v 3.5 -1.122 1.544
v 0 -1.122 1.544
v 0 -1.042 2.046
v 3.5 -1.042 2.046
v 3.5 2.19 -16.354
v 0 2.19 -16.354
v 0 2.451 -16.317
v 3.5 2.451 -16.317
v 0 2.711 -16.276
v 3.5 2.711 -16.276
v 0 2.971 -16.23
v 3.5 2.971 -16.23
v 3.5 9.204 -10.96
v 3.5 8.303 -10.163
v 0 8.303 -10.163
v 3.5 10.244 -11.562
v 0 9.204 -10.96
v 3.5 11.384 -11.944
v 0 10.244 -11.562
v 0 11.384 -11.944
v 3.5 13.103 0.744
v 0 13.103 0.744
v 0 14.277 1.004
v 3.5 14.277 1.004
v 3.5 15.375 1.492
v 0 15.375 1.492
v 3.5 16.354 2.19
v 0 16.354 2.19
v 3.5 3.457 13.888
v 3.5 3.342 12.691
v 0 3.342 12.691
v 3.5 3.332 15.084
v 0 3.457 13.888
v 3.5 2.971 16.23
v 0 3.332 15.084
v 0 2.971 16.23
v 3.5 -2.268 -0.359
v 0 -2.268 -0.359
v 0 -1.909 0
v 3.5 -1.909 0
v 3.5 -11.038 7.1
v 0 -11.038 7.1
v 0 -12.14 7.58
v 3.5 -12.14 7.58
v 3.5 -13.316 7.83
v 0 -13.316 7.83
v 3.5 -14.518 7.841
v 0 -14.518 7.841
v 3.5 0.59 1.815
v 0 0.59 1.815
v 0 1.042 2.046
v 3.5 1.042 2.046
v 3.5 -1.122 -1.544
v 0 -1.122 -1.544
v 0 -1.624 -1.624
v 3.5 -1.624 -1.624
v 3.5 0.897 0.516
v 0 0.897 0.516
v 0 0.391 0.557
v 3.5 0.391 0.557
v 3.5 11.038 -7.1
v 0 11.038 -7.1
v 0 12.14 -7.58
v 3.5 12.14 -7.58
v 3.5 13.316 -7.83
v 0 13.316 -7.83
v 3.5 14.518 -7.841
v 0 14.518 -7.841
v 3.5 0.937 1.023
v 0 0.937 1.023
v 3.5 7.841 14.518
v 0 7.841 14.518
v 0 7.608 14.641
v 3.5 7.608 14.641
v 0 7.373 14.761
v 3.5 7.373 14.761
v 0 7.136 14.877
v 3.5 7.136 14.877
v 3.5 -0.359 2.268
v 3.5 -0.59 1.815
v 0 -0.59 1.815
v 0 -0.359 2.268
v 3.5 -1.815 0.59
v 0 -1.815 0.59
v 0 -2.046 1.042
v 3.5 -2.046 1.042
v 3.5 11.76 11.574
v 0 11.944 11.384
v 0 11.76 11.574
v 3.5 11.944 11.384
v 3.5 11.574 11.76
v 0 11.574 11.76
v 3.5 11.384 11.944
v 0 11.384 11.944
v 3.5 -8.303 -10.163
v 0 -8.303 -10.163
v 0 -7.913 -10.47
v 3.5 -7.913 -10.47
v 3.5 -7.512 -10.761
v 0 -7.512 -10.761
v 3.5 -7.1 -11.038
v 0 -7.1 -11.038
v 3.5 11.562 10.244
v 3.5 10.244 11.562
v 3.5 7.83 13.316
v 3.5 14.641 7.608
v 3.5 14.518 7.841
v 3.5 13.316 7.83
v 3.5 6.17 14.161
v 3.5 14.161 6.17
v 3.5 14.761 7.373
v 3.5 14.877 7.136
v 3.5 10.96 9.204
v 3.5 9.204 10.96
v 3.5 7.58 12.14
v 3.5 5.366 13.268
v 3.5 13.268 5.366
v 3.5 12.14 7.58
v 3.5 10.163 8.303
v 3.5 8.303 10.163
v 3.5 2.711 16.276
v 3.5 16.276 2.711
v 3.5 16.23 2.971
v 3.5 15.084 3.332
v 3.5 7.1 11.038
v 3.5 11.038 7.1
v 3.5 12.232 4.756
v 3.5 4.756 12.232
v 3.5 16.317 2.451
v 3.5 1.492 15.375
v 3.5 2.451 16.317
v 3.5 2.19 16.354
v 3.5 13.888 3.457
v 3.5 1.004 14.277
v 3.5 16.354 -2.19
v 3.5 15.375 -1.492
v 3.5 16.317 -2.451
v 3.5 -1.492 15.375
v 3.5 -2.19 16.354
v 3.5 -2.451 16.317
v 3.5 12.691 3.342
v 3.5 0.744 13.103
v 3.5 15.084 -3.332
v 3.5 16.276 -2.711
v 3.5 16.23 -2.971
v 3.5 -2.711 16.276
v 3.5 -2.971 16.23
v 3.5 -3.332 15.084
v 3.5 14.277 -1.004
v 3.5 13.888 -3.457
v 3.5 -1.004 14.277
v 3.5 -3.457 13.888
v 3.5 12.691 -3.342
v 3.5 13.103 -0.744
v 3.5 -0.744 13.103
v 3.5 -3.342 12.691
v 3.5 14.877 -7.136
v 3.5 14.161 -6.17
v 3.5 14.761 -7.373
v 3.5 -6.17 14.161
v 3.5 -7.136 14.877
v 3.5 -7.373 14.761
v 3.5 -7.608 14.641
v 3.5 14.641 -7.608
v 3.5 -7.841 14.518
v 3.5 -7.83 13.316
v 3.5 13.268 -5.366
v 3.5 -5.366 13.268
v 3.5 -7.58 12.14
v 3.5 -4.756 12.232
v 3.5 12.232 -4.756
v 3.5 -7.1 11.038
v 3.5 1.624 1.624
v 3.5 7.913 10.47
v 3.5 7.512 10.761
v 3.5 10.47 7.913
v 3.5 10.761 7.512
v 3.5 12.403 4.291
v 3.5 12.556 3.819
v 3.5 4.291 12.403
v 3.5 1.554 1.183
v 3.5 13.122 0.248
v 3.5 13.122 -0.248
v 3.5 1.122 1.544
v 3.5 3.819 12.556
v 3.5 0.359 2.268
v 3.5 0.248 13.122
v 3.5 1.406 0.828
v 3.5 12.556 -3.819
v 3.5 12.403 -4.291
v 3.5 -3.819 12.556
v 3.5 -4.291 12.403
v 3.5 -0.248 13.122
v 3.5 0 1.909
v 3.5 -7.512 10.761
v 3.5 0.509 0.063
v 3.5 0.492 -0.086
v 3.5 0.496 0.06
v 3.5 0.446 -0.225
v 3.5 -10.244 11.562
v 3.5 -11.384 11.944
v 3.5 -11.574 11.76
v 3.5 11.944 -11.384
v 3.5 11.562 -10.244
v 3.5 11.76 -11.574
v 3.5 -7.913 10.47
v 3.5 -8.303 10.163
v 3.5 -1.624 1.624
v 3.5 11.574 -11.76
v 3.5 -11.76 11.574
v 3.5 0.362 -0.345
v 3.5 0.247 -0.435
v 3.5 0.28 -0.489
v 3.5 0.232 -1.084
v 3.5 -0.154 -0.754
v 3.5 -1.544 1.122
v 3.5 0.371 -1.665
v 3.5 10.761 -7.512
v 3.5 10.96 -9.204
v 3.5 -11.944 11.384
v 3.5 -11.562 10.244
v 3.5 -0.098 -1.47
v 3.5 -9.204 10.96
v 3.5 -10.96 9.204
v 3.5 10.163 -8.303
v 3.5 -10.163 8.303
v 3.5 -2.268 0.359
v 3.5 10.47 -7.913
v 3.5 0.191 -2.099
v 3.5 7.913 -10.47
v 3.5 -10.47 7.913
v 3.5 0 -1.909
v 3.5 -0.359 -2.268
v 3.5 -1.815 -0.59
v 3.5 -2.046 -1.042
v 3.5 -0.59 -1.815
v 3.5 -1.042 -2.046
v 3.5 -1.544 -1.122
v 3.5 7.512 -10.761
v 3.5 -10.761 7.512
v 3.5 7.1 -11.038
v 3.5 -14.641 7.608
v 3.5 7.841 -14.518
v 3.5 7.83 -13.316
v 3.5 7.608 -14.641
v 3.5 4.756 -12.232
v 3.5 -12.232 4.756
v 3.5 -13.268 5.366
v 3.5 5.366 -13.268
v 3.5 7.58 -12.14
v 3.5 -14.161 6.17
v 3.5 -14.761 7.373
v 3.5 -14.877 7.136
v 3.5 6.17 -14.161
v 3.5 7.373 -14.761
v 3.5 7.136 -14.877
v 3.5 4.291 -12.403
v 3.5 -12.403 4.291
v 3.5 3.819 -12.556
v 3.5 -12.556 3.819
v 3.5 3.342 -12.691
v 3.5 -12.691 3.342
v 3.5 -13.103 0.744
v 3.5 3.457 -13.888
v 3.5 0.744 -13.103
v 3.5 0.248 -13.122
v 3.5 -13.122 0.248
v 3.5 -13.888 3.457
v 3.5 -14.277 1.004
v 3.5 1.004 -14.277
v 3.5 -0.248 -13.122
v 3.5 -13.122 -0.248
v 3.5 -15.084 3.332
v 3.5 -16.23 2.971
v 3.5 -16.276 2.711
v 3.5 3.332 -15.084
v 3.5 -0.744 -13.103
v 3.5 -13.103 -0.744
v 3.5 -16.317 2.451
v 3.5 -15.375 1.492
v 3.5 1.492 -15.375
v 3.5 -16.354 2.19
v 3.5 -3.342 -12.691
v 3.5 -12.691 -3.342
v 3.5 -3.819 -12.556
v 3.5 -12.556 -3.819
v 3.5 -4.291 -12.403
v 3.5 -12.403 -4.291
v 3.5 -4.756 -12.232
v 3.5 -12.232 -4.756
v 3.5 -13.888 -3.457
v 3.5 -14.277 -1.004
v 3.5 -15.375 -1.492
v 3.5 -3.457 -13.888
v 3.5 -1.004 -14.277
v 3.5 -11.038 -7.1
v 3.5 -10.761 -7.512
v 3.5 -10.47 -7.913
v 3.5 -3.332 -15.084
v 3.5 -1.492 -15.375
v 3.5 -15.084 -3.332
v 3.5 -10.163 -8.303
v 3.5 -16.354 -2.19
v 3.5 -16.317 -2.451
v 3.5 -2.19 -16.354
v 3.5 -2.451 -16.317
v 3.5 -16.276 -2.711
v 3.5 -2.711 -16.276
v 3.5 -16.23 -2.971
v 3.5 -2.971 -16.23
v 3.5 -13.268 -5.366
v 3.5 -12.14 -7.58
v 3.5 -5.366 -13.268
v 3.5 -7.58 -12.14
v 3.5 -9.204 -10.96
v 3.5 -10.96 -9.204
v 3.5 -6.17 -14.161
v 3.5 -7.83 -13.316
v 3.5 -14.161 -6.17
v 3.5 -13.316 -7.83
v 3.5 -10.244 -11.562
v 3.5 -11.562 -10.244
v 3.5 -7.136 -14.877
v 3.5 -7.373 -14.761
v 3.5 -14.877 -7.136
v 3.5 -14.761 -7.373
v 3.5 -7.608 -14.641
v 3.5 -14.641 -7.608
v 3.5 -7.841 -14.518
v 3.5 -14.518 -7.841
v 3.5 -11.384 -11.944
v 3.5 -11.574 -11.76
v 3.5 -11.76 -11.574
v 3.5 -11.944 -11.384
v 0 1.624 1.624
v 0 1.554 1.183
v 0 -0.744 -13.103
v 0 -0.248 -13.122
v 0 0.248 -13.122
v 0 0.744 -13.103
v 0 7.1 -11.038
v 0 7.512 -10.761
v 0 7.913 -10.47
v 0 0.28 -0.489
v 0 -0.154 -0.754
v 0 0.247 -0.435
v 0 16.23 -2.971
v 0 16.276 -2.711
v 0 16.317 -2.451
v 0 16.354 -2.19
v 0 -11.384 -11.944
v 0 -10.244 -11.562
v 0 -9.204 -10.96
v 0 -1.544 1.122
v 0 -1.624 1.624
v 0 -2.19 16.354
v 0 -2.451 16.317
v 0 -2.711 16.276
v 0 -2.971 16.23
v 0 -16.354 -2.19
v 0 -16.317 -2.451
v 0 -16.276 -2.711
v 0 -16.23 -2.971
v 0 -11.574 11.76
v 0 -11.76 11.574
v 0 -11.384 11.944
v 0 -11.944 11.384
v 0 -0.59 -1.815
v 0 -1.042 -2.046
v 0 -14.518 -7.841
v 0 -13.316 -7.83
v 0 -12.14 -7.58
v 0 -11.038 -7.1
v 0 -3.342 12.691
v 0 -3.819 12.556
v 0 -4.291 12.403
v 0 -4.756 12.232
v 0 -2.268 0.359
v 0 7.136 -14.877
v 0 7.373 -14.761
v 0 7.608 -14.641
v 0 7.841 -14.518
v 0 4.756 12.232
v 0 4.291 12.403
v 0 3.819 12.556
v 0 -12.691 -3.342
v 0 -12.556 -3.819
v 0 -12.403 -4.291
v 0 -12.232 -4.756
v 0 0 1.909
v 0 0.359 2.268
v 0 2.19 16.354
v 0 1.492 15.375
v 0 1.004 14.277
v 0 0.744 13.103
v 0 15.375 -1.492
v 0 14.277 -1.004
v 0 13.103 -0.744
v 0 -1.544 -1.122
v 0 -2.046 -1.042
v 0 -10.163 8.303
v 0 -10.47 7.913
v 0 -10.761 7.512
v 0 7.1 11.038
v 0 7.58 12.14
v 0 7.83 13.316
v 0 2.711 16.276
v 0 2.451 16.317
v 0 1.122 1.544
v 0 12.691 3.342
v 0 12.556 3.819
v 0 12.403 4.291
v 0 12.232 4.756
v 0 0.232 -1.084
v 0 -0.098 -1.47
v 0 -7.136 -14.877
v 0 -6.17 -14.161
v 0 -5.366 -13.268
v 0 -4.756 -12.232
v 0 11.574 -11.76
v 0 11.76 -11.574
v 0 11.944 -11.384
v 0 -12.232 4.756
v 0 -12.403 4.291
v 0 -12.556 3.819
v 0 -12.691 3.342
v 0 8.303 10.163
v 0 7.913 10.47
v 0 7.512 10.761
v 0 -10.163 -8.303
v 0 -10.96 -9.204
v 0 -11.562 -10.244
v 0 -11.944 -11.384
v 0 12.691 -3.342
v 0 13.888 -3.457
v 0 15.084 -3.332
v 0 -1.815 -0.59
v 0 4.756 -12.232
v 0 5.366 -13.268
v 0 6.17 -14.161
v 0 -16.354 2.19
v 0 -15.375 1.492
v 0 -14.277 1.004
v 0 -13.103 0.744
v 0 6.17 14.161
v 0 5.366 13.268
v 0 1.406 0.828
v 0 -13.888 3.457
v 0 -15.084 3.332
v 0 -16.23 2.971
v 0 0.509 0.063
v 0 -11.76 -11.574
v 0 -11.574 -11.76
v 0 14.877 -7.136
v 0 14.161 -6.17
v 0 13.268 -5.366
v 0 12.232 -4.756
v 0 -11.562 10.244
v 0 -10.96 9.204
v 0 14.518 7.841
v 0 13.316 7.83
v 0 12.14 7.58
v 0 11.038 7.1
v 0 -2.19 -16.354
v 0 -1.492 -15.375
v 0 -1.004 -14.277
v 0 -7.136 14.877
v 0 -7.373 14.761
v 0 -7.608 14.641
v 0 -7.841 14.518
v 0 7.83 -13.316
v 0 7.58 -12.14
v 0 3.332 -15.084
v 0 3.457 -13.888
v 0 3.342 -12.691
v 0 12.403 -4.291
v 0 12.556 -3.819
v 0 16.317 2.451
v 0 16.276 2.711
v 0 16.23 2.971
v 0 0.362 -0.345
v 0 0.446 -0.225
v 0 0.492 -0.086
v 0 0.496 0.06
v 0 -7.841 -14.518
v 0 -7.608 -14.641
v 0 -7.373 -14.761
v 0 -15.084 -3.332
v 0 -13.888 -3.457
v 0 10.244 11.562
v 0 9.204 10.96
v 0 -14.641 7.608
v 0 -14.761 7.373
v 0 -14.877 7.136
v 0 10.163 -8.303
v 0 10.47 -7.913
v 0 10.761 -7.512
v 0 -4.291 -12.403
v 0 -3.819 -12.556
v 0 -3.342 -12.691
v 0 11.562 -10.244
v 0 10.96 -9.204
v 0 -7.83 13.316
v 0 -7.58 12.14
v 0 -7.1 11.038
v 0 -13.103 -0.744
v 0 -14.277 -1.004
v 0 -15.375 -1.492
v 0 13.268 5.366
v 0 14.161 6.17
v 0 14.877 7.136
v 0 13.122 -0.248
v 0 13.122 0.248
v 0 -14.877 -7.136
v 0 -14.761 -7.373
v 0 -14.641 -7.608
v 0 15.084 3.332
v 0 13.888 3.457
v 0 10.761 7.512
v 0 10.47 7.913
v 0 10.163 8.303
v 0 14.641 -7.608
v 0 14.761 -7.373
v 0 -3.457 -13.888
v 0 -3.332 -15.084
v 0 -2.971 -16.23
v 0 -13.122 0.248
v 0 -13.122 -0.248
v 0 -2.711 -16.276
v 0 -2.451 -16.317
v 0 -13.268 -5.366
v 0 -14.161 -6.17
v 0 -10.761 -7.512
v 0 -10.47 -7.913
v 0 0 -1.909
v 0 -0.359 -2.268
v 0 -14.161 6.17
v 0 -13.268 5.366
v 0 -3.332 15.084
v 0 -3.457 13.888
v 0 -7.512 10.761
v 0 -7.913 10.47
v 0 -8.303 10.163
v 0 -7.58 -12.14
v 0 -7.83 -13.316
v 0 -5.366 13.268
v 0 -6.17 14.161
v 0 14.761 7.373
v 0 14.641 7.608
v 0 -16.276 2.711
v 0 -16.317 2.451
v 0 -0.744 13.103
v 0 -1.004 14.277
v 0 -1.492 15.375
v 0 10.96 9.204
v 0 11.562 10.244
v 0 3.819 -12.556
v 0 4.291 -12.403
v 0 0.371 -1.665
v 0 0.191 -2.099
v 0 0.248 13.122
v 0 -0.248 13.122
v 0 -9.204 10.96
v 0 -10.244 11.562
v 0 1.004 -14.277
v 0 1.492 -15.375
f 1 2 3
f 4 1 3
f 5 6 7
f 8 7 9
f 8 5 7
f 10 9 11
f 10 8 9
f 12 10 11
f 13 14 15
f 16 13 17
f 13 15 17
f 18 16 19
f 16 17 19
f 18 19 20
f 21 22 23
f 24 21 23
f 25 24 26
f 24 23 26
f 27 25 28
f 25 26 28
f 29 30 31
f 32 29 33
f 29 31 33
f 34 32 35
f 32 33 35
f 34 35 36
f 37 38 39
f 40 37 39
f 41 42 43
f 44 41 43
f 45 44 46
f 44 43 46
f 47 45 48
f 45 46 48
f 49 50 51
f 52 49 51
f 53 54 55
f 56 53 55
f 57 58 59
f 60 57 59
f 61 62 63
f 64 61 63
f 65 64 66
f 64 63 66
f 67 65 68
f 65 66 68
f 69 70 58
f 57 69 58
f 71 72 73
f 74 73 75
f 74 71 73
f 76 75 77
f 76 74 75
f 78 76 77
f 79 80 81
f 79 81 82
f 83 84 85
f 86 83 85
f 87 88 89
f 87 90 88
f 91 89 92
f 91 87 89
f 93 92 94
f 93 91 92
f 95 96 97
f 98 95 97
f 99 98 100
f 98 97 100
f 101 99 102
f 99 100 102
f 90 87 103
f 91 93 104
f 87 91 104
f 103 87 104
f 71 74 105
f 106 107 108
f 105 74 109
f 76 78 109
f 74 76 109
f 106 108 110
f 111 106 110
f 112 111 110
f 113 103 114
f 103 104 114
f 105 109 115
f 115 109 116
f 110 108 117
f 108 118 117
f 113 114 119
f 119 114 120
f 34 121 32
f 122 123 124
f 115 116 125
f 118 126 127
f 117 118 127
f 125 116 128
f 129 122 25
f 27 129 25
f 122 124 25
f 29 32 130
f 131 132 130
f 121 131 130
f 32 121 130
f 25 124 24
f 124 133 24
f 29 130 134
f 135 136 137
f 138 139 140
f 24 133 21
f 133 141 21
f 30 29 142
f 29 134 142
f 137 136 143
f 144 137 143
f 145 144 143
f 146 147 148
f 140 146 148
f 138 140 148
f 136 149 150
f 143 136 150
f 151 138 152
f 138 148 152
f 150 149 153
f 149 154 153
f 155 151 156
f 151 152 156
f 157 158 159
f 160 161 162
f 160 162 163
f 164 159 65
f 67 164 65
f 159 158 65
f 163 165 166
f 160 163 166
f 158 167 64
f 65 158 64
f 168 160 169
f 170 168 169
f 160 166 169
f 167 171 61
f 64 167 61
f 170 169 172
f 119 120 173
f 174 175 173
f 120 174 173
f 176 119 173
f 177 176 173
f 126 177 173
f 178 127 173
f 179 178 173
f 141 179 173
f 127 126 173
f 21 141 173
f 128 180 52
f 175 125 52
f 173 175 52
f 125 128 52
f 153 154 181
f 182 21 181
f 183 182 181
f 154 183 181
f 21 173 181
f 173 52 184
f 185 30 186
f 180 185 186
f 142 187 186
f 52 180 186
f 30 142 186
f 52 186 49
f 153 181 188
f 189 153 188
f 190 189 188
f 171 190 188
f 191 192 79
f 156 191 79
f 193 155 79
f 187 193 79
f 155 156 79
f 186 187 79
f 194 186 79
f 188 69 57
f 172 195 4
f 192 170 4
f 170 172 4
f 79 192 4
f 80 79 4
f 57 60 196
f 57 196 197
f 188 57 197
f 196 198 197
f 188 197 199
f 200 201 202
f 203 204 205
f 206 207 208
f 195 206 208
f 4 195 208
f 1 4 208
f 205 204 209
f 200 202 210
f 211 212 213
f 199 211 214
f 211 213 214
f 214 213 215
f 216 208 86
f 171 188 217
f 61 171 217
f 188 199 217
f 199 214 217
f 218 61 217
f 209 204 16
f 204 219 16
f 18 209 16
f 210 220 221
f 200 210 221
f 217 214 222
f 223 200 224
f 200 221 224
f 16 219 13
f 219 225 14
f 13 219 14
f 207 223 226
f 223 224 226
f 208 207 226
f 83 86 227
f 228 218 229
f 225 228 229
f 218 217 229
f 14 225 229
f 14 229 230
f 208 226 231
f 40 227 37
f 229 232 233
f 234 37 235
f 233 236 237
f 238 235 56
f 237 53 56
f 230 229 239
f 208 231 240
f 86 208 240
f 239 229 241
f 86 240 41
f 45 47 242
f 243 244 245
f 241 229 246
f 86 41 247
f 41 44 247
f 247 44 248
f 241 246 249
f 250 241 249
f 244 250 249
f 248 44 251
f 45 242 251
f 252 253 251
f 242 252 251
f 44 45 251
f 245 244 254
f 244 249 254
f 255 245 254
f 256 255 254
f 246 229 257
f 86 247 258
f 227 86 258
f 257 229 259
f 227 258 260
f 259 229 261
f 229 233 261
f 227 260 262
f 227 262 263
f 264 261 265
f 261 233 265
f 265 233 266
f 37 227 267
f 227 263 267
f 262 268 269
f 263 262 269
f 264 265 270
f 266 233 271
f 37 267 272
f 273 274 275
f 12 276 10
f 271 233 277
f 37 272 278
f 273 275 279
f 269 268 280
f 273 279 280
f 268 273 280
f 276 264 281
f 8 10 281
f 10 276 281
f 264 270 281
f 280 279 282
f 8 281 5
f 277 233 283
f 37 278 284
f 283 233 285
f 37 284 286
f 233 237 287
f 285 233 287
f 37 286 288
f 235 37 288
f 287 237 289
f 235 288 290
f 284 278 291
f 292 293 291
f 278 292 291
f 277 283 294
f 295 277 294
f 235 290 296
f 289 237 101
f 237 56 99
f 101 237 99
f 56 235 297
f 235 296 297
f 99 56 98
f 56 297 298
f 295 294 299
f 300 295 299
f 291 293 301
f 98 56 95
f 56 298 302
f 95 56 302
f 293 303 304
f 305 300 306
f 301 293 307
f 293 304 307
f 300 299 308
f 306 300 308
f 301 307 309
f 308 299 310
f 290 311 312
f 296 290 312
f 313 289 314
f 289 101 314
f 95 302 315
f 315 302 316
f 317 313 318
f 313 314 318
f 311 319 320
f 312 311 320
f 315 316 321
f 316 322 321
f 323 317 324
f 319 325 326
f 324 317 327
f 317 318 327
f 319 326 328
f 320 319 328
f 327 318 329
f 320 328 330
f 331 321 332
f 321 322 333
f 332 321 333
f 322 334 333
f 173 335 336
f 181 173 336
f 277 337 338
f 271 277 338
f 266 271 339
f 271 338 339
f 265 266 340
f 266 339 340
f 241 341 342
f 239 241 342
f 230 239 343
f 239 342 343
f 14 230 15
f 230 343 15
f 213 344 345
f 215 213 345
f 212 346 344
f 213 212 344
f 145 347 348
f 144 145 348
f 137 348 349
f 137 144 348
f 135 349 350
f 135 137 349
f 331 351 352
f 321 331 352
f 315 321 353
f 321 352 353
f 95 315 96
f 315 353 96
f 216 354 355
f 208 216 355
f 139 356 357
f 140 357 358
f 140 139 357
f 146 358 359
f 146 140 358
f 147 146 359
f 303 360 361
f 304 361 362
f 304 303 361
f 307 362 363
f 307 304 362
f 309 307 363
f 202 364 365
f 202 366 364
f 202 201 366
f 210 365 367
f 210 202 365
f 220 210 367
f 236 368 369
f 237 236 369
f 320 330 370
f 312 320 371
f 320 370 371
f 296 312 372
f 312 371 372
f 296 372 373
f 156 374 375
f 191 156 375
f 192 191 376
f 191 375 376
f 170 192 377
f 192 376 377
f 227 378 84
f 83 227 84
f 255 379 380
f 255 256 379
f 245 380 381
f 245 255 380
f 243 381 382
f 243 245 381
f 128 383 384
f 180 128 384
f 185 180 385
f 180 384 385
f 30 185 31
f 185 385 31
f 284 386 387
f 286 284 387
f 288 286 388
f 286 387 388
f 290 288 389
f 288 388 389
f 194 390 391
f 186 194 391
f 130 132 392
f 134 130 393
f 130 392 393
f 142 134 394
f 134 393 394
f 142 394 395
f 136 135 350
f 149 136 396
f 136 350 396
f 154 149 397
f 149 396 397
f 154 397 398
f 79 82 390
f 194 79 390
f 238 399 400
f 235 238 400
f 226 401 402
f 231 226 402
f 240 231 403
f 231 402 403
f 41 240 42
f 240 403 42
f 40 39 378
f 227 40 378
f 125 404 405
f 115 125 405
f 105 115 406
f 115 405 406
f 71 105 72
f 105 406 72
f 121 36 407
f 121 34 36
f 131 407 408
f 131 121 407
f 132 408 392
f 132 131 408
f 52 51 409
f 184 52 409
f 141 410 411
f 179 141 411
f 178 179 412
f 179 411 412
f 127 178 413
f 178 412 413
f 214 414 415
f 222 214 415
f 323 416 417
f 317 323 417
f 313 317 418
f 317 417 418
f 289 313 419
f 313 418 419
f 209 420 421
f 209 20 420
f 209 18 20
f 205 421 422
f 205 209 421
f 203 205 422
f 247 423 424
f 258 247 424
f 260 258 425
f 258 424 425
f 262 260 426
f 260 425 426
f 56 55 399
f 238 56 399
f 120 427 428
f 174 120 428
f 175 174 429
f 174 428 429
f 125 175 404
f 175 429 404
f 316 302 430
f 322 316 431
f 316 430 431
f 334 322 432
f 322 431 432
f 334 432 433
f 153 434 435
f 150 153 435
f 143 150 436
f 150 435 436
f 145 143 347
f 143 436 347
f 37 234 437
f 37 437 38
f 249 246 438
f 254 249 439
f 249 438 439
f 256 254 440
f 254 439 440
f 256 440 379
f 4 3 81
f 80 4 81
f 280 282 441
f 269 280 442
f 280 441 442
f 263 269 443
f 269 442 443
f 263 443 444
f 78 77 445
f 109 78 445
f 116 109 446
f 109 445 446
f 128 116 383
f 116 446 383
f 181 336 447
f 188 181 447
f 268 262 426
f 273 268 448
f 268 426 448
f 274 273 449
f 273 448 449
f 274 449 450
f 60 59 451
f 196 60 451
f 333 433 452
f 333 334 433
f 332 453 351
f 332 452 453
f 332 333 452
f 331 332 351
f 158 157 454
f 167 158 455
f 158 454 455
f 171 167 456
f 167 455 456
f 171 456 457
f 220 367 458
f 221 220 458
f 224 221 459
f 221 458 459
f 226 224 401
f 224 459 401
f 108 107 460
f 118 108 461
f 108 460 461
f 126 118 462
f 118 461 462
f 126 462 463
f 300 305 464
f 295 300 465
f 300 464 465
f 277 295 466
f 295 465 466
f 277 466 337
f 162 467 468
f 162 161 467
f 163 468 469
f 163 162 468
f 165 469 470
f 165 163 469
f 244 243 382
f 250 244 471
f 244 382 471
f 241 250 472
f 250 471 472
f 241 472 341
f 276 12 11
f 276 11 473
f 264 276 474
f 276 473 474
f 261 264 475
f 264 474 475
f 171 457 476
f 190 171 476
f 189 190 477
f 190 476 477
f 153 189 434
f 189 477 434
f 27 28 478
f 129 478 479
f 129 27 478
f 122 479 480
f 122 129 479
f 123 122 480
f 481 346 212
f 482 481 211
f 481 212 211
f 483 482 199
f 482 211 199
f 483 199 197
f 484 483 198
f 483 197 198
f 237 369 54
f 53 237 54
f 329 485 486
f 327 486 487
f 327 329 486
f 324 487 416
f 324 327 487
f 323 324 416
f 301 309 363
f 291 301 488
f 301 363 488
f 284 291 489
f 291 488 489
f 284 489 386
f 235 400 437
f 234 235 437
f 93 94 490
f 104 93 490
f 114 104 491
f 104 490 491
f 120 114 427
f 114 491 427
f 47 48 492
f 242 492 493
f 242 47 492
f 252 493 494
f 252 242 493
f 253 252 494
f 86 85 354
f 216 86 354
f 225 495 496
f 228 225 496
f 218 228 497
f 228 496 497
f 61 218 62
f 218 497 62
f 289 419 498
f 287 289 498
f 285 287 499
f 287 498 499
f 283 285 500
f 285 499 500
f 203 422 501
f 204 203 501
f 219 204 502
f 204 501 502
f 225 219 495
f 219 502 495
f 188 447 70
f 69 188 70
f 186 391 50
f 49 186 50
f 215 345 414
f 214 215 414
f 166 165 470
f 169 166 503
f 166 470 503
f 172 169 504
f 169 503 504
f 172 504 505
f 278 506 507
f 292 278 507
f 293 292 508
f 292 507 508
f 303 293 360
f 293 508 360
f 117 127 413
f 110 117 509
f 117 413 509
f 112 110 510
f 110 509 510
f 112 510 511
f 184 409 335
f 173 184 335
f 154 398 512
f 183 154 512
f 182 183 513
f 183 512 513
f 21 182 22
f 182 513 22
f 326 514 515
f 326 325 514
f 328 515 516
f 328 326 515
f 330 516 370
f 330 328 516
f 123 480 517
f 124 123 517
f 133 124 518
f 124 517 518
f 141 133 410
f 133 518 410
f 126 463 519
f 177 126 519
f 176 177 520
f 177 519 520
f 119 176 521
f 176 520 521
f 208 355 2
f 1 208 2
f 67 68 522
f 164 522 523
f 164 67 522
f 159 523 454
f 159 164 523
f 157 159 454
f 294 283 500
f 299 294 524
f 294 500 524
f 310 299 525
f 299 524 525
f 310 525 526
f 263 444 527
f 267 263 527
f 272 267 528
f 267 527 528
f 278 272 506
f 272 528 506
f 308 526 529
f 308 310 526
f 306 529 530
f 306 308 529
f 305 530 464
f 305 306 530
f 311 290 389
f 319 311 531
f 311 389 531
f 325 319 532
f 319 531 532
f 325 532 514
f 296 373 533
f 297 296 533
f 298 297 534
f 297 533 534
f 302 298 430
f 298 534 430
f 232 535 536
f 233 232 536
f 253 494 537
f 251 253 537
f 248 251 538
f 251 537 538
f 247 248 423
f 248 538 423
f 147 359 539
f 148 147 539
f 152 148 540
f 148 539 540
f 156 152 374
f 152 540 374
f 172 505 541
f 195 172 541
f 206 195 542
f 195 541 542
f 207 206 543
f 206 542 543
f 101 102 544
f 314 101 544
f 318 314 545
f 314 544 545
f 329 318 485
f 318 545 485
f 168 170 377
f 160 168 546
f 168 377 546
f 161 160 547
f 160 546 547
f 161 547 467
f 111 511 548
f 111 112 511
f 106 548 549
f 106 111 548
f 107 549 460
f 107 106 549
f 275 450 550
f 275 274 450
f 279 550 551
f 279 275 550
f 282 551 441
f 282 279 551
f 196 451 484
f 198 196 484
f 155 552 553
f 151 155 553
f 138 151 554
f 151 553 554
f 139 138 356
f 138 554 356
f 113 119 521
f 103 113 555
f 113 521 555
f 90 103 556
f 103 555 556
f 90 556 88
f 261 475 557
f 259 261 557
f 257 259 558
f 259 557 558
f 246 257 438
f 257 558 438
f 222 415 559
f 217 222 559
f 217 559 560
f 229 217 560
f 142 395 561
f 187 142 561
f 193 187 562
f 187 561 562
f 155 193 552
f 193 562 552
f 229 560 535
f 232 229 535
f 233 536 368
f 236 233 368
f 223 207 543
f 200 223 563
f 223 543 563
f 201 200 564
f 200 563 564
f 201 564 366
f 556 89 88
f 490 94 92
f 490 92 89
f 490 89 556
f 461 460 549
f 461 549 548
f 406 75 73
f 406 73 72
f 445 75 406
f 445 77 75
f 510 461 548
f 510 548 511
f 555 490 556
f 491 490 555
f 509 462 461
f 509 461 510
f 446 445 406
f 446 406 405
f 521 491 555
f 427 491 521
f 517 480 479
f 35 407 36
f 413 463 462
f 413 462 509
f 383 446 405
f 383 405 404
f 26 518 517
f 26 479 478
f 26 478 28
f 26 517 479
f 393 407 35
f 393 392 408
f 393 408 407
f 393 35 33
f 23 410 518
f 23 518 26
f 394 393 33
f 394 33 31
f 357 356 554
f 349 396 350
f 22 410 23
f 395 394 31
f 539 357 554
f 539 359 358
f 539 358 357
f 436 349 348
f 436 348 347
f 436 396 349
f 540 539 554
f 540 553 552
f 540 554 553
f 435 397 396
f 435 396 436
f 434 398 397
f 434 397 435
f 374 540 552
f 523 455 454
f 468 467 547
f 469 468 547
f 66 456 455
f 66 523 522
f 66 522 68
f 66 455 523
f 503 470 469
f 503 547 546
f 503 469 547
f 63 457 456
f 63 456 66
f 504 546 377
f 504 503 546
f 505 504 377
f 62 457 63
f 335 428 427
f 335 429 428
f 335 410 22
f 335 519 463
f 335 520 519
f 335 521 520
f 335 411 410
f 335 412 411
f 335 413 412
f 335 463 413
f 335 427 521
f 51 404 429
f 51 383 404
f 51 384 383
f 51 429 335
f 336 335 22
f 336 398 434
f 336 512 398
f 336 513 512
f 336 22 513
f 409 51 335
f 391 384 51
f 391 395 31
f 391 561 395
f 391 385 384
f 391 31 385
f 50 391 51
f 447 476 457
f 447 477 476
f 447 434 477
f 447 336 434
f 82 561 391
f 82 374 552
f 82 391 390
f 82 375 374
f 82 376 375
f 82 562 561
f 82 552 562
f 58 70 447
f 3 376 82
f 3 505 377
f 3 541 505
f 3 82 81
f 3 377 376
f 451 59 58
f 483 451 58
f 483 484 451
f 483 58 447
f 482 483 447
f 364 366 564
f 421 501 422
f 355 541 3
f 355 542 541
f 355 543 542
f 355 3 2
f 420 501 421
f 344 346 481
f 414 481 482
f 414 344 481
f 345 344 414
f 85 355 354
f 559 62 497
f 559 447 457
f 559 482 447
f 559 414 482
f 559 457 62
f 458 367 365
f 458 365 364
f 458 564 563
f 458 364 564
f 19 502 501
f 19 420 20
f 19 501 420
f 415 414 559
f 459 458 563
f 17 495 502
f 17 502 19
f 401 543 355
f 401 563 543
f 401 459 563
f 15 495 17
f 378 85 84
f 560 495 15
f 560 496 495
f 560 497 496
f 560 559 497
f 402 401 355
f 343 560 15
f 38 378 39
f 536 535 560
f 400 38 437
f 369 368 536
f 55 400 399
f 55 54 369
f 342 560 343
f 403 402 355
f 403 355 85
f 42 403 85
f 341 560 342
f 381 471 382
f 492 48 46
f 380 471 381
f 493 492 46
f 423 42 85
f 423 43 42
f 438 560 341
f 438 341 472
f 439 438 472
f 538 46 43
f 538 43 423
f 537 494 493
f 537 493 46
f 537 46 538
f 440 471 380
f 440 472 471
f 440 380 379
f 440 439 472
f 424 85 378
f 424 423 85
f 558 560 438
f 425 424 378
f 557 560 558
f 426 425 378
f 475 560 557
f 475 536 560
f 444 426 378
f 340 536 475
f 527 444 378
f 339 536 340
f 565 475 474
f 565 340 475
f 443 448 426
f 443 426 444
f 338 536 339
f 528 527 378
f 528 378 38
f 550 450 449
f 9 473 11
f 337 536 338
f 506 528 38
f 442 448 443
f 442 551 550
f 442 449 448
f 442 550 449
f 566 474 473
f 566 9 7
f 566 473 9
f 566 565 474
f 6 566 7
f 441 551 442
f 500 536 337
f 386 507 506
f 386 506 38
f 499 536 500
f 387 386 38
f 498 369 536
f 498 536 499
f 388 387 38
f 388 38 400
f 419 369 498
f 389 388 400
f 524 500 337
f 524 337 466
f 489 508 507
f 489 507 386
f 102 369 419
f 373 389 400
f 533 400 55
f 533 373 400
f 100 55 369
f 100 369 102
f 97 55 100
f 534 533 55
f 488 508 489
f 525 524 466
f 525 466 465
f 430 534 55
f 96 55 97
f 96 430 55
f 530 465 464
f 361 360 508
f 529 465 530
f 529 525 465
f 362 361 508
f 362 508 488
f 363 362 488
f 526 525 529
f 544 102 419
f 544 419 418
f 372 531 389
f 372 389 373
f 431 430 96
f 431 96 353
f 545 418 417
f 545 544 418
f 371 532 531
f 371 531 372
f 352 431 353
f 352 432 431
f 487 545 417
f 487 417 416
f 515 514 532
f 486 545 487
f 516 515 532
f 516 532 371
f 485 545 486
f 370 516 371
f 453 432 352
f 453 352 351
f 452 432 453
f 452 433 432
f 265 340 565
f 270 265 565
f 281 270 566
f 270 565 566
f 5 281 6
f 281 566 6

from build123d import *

# Parameters (mm, degrees)
BASPROSKE_W        = 3.5
BASPROSKE_H        = 16.5
TOOTHCUT_DEPTH     = 24.595550428
TEETHCUTS_COUNT    = 20
TEETHCUTS_ANGLE    = 342
BORSKE_R           = 0.5
BORE_DEPTH         = 50.0000508
CUT_EXTRUDE1_DEPTH = 10


with BuildPart() as part:
    # BasProSke → Base-Revolve (revolve)
    with BuildSketch(Plane(origin=(0, 0, 0), x_dir=(1, 0, 0), z_dir=(0, 1, 0)), mode=Mode.PRIVATE) as base_revolve_sk:
        with Locations((1.75, 8.25)):
            Rectangle(BASPROSKE_W, BASPROSKE_H)
    revolve(base_revolve_sk.sketch.rotate(Axis((-10, 0, 0), (1, 0, 0)), 180), axis=Axis((-10, 0, 0), (1, 0, 0)))

    # TooCutSke → ToothCut (cut, through all)
    with BuildSketch(Plane(origin=(0, 0, 0), x_dir=(0, 0, -1), z_dir=(1, 0, 0))):
        with BuildLine():
            ThreePointArc((0.74381438, 13.102904875), (0, 13.124), (-0.74381438, 13.102904875))
            ThreePointArc((-0.74381438, 13.102904875), (-1.226473103, 14.852072512), (-2.209965745, 16.376962373))
            ThreePointArc((-2.209965745, 16.376962373), (0, 16.5254), (2.209965745, 16.376962373))
            ThreePointArc((2.209965745, 16.376962373), (1.226473103, 14.852072512), (0.74381438, 13.102904875))
        make_face()
    toothcut = extrude(amount=TOOTHCUT_DEPTH, mode=Mode.SUBTRACT)

    # TeethCuts: ToothCut ×20 about axis
    teethcuts_axis = Axis((-10, 0, 0), (1, 0, 0))
    for i in range(1, TEETHCUTS_COUNT):
        add(toothcut.rotate(teethcuts_axis, i * TEETHCUTS_ANGLE / (TEETHCUTS_COUNT - 1)), mode=Mode.SUBTRACT)

    # BorSke → Bore (cut, symmetric)
    with BuildSketch(Plane(origin=(0, 0, 0), x_dir=(0, 0, -1), z_dir=(1, 0, 0))):
        with Locations(Location((0, 0, 0), (0, 0, 180))):
            Circle(BORSKE_R)
    extrude(amount=BORE_DEPTH, both=True, mode=Mode.SUBTRACT)

    # Sketch1 → Cut-Extrude1 (cut)
    with BuildSketch(Plane.ZY):
        Polygon((-1.083959973, 0.232340082), (-1.46991278, -0.097897743), (-1.664721638, 0.37121429), (-2.099317612, 0.190738968), (-1.908578644, 0), (-2.267755891, -0.359177248), (-1.815166156, -0.589783236), (-2.045772144, -1.042372971), (-1.544072558, -1.12183438), (-1.623533966, -1.623533966), (-1.12183438, -1.544072558), (-1.042372971, -2.045772144), (-0.589783236, -1.815166156), (-0.359177248, -2.267755891), (0, -1.908578644), (0.359177248, -2.267755891), (0.589783236, -1.815166156), (1.042372971, -2.045772144), (1.12183438, -1.544072558), (1.623533966, -1.623533966), (1.544072558, -1.12183438), (2.045772144, -1.042372971), (1.815166156, -0.589783236), (2.267755891, -0.359177248), (1.908578644, 0), (2.267755891, 0.359177248), (1.815166156, 0.589783236), (2.045772144, 1.042372971), (1.544072558, 1.12183438), (1.623533966, 1.623533966), (1.182876639, 1.553740702), (0.828023136, 1.406380155), (1.022831994, 0.937268122), (0.516480691, 0.896957479), (0.556791334, 0.390606175), (0.062765954, 0.508739633), (-0.055367504, 0.014714252), (-0.488708315, 0.279728085), (-0.753722148, -0.153612726), align=None)
    extrude(amount=-CUT_EXTRUDE1_DEPTH, mode=Mode.SUBTRACT)


solid = part.part
